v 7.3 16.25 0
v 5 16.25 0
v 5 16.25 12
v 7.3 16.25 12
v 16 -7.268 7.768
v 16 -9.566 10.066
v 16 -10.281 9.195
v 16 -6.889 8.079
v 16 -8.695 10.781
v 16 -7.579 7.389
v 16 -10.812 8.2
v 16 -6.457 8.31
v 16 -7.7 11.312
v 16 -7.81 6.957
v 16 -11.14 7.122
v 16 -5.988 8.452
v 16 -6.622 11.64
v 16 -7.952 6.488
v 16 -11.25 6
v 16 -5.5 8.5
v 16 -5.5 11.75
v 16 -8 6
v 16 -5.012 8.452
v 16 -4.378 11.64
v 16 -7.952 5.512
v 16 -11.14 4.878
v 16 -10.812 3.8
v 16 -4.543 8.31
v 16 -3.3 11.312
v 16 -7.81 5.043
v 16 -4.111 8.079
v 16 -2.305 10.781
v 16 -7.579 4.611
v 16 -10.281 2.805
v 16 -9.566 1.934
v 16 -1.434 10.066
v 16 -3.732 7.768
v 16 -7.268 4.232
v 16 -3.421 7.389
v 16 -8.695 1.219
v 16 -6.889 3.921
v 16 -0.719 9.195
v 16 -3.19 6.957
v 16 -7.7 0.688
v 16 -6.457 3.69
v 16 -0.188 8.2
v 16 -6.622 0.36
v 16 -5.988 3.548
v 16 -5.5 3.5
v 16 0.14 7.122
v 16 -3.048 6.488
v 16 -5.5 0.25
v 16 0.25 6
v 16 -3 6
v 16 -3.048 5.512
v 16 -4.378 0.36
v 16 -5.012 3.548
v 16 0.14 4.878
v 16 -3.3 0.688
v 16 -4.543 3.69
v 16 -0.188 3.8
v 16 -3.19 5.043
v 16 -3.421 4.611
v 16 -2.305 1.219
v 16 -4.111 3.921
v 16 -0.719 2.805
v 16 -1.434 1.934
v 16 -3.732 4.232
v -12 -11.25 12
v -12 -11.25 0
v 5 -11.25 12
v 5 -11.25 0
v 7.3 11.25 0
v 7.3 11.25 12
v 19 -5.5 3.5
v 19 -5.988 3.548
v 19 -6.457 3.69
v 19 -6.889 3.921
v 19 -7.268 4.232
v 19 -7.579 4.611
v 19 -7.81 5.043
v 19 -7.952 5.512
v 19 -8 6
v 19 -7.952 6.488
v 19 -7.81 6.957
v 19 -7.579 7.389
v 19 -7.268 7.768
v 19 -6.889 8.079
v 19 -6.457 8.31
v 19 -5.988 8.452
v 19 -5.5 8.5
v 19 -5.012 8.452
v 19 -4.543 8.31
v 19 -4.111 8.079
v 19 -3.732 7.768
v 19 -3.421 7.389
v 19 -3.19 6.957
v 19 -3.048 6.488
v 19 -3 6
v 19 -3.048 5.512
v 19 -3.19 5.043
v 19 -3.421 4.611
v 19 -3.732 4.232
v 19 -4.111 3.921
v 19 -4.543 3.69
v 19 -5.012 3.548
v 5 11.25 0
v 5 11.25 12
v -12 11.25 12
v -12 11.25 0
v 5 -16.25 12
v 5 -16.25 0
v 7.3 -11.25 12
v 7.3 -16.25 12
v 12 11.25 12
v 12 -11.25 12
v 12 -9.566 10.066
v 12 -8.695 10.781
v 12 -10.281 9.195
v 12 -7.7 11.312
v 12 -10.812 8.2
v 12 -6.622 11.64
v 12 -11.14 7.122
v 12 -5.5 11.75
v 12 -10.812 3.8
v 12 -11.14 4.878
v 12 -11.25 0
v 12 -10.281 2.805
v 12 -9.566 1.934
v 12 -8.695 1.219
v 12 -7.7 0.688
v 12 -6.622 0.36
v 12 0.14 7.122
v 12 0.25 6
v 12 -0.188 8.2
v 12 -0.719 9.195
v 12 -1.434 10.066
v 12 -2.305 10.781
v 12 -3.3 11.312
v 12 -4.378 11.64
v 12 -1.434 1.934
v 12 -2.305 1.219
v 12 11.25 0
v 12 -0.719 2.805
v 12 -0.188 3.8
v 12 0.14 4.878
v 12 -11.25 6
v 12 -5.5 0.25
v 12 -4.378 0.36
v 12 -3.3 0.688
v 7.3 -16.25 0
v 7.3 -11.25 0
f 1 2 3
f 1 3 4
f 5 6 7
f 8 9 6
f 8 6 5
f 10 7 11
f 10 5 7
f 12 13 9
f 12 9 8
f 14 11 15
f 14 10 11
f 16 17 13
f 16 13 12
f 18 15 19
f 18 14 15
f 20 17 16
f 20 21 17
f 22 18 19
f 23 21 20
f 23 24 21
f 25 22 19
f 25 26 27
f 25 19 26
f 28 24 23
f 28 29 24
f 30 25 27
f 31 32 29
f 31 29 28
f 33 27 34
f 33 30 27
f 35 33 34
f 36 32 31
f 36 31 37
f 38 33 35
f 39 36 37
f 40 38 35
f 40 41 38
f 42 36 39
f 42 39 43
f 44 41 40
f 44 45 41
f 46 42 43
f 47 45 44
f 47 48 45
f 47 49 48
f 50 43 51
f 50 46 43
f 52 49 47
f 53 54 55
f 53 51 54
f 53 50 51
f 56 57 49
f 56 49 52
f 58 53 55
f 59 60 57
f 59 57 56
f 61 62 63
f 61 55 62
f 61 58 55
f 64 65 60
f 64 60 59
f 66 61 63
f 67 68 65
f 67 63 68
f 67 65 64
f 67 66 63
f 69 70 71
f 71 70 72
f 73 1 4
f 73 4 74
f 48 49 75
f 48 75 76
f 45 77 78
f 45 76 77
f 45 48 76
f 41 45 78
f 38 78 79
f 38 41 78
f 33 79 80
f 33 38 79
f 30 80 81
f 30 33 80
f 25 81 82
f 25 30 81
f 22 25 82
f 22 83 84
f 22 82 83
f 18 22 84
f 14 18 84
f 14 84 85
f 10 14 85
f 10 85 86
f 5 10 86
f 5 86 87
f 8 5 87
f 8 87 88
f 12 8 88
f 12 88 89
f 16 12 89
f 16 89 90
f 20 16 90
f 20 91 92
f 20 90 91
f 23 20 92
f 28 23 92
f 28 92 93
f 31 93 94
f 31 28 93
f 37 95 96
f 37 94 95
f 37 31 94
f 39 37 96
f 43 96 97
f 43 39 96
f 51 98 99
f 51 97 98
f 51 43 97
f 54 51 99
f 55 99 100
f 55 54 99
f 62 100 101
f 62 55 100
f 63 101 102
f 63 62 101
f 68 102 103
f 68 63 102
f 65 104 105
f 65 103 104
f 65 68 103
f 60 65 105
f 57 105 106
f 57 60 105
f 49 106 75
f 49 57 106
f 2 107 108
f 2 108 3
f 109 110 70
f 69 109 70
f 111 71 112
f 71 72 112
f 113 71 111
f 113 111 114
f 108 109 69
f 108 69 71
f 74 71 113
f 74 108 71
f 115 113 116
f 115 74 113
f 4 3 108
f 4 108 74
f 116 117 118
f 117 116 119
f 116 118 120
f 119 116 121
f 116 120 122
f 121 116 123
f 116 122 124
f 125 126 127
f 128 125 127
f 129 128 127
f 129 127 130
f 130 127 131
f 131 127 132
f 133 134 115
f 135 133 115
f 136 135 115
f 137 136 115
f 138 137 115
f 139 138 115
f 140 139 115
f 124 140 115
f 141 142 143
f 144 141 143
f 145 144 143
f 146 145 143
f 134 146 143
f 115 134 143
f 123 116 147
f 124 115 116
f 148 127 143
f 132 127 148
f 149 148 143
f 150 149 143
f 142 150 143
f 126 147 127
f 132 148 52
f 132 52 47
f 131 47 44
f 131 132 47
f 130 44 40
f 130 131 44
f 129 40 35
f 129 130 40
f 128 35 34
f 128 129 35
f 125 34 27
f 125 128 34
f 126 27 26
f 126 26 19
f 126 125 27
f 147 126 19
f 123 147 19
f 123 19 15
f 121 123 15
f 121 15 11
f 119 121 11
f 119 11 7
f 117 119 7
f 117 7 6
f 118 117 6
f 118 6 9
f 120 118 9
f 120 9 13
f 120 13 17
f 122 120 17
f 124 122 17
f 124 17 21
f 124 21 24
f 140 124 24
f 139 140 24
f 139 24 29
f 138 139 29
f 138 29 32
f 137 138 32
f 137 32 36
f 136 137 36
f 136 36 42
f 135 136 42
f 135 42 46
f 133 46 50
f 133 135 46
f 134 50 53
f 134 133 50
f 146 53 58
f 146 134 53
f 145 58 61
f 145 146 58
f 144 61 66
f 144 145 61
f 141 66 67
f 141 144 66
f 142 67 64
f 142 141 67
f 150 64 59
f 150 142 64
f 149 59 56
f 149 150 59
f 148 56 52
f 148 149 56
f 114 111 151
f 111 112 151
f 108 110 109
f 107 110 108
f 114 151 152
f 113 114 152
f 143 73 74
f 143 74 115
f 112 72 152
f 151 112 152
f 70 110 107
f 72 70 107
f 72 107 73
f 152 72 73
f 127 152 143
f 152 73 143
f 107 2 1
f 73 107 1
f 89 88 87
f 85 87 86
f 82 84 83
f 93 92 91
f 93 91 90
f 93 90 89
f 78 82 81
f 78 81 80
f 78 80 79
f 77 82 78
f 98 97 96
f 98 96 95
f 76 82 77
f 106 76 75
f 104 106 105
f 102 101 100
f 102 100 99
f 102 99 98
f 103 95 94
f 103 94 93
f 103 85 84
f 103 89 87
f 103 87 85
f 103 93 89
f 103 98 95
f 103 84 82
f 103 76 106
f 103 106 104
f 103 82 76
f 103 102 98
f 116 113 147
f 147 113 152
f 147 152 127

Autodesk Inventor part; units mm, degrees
sketch "Sketch14" plane through (0, 0, 0) normal (0, 0, 1) x (1, 0, 0)
  line L0 (12, -11.25) -> (12, 11.25)
  line L1 (-12, 11.25) -> (-12, -11.25)
  line L2 (-12, -11.25) -> (12, 11.25) construction
  line L3 (12, -11.25) -> (-12, 11.25) construction
  line L4 (-12, 11.25) -> (5, 11.25)
  line L5 (5, 11.25) -> (5, 16.25)
  line L6 (5, 16.25) -> (7.3, 16.25)
  line L7 (7.3, 16.25) -> (7.3, 11.25)
  line L8 (5, -11.25) -> (5, -16.25)
  line L9 (5, -16.25) -> (7.3, -16.25)
  line L10 (7.3, -16.25) -> (7.3, -11.25)
  line L11 (7.3, 11.25) -> (12, 11.25)
  line L12 (7.3, -11.25) -> (12, -11.25)
  line L13 (-12, -11.25) -> (5, -11.25)
  line L14 (7.3, -11.25) -> (7.3, -16.25)
  line L15 (5, -16.25) -> (5, -11.25)
  line L16 (-12, -11.25) -> (-12, 11.25)
  line L17 (5, 11.25) -> (-12, 11.25)
  line L18 (-12, -11.25) -> (5, -11.25)
  line L19 (5, -11.25) -> (5, -16.25)
  line L20 (7.3, -11.25) -> (12, -11.25)
  line L21 (12, 11.25) -> (7.3, 11.25)
  line L22 (-12, 11.25) -> (12, 11.25)
  line L23 (12, 11.25) -> (12, -11.25)
  line L24 (12, -11.25) -> (-12, -11.25)
  line L25 (-12, -11.25) -> (-12, 11.25)
  line L26 (5, 16.25) -> (7.3, 16.25)
  line L27 (7.3, 16.25) -> (7.3, 11.25)
  line L28 (7.3, 11.25) -> (5, 11.25)
  line L29 (5, 11.25) -> (5, 16.25)
  line L30 (5, -11.25) -> (7.3, -11.25)
  line L31 (7.3, -11.25) -> (7.3, -16.25)
  line L32 (7.3, -16.25) -> (5, -16.25)
  line L33 (5, -16.25) -> (5, -11.25)
  point P0 (0, 0)
  dimension "d105" = 24
  dimension "d106" = 22.5
  dimension "d107" = 17
  dimension "d108" = 5
  dimension "d109" = 2.3
extrude "Extrusion12" add sketch "Sketch14" along normal blind 12
sketch "Sketch15" plane through (12, -11.25, 0) normal (1, 0, 0) x (0, 0, -1)
  line L0 (0, 0) -> (0, -5) projected
  line L1 (0, -5) -> (-6, -5)
  line L2 (0, -5) -> (-12, -5) projected
  line L3 (-6, -5) -> (-6, 5.75)
  circle A0 centre (-6, 5.75) radius 5.75
  point P0 (0, 11.25)
  dimension "d112" = 10.75
  dimension "d113" = 11.5
extrude "Extrusion13" add sketch "Sketch15" along normal blind 4
sketch "Sketch16" plane through (16, -5.5, 6) normal (1, 0, 0) x (0, 0, -1)
  circle A0 centre (0, 0) radius 5.75 projected
  circle A1 centre (0, 0) radius 2.5
  point P0 (6, 5.5)
  dimension "d116" = 5
extrude "Extrusion14" add sketch "Sketch16" along normal blind 3 contours A1
sketch "Sketch18" plane through (0, 0, 12) normal (0, 0, 1) x (1, 0, 0)
  line L0 (-10.7887, 4.9339) -> (3.2892, 4.9339) construction
  line L1 (3.2892, 4.9339) -> (3.2892, -9.473) construction
  line L2 (3.2892, -9.473) -> (-10.7887, -9.473) construction
  line L3 (-10.7887, -9.473) -> (-10.7887, 4.9339) construction
  point P0 (0, 0)
properties part number "Motor Waterkanon" material "S235"
